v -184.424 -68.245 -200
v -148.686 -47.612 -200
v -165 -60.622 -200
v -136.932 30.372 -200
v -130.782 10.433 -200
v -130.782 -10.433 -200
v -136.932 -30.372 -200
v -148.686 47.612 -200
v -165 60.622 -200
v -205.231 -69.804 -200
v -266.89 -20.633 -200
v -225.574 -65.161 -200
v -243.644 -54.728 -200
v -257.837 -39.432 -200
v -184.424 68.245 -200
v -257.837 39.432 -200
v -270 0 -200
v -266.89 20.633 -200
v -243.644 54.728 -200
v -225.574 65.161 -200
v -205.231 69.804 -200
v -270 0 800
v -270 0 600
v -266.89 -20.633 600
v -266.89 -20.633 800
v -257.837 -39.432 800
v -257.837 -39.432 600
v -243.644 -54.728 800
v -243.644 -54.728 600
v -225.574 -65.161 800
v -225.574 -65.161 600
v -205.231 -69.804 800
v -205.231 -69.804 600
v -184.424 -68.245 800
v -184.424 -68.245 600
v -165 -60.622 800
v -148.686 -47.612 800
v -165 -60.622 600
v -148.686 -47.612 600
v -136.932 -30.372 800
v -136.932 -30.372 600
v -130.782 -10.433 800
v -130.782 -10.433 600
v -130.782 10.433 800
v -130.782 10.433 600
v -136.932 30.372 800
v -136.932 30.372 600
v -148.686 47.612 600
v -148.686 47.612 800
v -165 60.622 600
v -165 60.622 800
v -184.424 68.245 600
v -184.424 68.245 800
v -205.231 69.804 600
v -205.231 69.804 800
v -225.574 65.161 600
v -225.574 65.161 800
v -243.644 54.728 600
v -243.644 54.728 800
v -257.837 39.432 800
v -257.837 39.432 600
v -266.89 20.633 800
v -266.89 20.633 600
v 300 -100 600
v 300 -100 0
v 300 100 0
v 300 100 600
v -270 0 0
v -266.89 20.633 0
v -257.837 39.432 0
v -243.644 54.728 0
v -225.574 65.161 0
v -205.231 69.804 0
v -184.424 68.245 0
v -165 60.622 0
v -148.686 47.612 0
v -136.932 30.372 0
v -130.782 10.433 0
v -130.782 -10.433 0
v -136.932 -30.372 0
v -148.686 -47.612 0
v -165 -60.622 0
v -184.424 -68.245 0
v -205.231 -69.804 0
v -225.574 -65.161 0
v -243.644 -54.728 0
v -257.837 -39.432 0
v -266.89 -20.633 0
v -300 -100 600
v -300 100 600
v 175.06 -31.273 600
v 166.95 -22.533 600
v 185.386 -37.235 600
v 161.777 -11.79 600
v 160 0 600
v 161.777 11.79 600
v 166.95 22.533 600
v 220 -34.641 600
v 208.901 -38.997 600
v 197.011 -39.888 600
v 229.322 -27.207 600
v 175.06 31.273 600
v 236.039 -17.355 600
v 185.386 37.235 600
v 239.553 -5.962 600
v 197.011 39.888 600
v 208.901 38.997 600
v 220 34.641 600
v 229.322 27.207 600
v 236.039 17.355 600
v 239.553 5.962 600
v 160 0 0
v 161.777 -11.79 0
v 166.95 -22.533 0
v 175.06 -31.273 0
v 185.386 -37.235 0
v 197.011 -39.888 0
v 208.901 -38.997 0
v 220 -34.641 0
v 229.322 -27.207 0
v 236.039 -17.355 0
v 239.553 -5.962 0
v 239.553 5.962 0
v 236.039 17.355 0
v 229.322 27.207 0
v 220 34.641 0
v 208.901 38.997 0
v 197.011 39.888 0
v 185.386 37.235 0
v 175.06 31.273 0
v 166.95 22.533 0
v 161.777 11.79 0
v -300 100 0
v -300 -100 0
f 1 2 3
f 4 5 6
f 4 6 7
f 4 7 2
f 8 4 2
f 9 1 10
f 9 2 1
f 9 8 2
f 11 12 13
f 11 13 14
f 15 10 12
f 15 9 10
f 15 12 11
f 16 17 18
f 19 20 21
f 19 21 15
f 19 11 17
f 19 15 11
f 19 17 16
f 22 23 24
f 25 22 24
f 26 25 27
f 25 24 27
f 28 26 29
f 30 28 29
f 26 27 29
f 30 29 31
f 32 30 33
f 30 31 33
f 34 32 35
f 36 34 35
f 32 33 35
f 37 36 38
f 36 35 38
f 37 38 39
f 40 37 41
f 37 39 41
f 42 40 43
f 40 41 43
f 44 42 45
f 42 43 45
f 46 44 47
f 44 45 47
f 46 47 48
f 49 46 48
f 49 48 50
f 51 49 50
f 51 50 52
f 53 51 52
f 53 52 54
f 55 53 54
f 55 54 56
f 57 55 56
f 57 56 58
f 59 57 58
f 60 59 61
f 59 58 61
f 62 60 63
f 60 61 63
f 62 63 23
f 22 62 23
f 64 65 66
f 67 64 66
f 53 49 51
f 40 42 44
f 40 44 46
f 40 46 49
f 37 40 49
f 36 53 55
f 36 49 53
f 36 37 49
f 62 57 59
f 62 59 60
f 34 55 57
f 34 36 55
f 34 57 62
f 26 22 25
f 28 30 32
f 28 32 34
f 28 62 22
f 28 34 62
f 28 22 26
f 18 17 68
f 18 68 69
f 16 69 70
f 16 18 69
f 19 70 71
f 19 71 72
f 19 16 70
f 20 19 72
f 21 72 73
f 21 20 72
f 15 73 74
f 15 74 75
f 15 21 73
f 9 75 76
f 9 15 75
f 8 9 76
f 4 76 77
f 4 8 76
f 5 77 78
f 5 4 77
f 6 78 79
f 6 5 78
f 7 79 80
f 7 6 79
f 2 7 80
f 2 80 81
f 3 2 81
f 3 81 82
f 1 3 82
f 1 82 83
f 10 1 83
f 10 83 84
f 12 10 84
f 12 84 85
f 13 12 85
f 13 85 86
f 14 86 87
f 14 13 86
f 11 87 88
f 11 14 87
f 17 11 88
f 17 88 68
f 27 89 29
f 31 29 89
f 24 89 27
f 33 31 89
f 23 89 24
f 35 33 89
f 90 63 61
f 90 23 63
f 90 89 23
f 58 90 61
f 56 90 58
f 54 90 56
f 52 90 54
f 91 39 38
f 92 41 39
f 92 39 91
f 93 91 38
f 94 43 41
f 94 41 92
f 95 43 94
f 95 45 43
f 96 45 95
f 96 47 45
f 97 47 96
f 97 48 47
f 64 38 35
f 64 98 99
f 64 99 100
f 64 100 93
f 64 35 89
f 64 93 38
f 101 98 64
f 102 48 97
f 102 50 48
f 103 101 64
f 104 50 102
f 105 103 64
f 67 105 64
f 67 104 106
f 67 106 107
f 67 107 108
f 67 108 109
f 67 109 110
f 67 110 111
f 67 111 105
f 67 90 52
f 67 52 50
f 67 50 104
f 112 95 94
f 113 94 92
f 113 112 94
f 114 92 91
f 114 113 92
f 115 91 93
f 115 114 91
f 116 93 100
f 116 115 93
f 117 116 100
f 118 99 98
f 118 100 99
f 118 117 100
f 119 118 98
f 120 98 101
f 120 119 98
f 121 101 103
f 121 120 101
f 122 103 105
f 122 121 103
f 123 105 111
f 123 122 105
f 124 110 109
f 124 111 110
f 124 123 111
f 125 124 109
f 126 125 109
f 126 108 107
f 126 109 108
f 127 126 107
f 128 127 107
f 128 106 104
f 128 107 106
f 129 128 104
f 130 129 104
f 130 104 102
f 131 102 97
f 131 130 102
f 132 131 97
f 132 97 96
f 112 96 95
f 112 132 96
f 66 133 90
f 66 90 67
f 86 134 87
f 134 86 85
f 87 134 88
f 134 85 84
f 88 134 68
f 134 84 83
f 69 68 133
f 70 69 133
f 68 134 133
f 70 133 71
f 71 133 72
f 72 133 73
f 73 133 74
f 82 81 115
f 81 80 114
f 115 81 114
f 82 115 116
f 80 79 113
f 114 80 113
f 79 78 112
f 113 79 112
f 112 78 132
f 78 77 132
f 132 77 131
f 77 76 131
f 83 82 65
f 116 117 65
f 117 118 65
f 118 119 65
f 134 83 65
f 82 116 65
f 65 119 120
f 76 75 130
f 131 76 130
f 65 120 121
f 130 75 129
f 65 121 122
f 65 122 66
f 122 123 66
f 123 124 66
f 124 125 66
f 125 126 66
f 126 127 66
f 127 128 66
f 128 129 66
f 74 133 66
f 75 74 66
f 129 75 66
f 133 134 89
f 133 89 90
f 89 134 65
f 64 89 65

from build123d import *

# Parameters (mm, degrees)
SKETCH1_W               = 600
SKETCH1_H               = 200
BOSS_EXTRUDE1_DEPTH     = 600
CUT_EXTRUDE1_DEPTH      = 40
CUT_EXTRUDE1_DEPTH_BACK = 600
SKETCH2_R               = 40
SKETCH3_R               = 70
BOSS_EXTRUDE2_DEPTH     = 200
BOSS_EXTRUDE3_START     = 200
SKETCH4_R               = 70
BOSS_EXTRUDE3_DEPTH     = 200


with BuildPart() as part:
    # Sketch1 → Boss-Extrude1 (new body)
    with BuildSketch(Plane.XY):
        Rectangle(SKETCH1_W, SKETCH1_H)
    extrude(amount=BOSS_EXTRUDE1_DEPTH)

    # Sketch2 → Cut-Extrude1 (cut, two sides: drawn at the far end of the back side and taken through both)
    with BuildSketch(Plane.XY.offset(600).offset(-CUT_EXTRUDE1_DEPTH_BACK)):
        with Locations(Location((200, 0, 0), (0, 0, 180))):
            Circle(SKETCH2_R)
    extrude(amount=CUT_EXTRUDE1_DEPTH + CUT_EXTRUDE1_DEPTH_BACK, mode=Mode.SUBTRACT)

    # Sketch3 → Boss-Extrude2 (add)
    with BuildSketch(Plane.XY.offset(600)):
        with Locations(Location((-200, 0, 0), (0, 0, 180))):
            Circle(SKETCH3_R)
    extrude(amount=BOSS_EXTRUDE2_DEPTH)

    # Sketch4 → Boss-Extrude3 (add)
    with BuildSketch(Plane(origin=(0, 0, 0), x_dir=(-1, 0, 0), z_dir=(0, 0, -1)).offset(BOSS_EXTRUDE3_START)):
        with Locations((200, 0)):
            Circle(SKETCH4_R)
    extrude(amount=-BOSS_EXTRUDE3_DEPTH)


solid = part.part
